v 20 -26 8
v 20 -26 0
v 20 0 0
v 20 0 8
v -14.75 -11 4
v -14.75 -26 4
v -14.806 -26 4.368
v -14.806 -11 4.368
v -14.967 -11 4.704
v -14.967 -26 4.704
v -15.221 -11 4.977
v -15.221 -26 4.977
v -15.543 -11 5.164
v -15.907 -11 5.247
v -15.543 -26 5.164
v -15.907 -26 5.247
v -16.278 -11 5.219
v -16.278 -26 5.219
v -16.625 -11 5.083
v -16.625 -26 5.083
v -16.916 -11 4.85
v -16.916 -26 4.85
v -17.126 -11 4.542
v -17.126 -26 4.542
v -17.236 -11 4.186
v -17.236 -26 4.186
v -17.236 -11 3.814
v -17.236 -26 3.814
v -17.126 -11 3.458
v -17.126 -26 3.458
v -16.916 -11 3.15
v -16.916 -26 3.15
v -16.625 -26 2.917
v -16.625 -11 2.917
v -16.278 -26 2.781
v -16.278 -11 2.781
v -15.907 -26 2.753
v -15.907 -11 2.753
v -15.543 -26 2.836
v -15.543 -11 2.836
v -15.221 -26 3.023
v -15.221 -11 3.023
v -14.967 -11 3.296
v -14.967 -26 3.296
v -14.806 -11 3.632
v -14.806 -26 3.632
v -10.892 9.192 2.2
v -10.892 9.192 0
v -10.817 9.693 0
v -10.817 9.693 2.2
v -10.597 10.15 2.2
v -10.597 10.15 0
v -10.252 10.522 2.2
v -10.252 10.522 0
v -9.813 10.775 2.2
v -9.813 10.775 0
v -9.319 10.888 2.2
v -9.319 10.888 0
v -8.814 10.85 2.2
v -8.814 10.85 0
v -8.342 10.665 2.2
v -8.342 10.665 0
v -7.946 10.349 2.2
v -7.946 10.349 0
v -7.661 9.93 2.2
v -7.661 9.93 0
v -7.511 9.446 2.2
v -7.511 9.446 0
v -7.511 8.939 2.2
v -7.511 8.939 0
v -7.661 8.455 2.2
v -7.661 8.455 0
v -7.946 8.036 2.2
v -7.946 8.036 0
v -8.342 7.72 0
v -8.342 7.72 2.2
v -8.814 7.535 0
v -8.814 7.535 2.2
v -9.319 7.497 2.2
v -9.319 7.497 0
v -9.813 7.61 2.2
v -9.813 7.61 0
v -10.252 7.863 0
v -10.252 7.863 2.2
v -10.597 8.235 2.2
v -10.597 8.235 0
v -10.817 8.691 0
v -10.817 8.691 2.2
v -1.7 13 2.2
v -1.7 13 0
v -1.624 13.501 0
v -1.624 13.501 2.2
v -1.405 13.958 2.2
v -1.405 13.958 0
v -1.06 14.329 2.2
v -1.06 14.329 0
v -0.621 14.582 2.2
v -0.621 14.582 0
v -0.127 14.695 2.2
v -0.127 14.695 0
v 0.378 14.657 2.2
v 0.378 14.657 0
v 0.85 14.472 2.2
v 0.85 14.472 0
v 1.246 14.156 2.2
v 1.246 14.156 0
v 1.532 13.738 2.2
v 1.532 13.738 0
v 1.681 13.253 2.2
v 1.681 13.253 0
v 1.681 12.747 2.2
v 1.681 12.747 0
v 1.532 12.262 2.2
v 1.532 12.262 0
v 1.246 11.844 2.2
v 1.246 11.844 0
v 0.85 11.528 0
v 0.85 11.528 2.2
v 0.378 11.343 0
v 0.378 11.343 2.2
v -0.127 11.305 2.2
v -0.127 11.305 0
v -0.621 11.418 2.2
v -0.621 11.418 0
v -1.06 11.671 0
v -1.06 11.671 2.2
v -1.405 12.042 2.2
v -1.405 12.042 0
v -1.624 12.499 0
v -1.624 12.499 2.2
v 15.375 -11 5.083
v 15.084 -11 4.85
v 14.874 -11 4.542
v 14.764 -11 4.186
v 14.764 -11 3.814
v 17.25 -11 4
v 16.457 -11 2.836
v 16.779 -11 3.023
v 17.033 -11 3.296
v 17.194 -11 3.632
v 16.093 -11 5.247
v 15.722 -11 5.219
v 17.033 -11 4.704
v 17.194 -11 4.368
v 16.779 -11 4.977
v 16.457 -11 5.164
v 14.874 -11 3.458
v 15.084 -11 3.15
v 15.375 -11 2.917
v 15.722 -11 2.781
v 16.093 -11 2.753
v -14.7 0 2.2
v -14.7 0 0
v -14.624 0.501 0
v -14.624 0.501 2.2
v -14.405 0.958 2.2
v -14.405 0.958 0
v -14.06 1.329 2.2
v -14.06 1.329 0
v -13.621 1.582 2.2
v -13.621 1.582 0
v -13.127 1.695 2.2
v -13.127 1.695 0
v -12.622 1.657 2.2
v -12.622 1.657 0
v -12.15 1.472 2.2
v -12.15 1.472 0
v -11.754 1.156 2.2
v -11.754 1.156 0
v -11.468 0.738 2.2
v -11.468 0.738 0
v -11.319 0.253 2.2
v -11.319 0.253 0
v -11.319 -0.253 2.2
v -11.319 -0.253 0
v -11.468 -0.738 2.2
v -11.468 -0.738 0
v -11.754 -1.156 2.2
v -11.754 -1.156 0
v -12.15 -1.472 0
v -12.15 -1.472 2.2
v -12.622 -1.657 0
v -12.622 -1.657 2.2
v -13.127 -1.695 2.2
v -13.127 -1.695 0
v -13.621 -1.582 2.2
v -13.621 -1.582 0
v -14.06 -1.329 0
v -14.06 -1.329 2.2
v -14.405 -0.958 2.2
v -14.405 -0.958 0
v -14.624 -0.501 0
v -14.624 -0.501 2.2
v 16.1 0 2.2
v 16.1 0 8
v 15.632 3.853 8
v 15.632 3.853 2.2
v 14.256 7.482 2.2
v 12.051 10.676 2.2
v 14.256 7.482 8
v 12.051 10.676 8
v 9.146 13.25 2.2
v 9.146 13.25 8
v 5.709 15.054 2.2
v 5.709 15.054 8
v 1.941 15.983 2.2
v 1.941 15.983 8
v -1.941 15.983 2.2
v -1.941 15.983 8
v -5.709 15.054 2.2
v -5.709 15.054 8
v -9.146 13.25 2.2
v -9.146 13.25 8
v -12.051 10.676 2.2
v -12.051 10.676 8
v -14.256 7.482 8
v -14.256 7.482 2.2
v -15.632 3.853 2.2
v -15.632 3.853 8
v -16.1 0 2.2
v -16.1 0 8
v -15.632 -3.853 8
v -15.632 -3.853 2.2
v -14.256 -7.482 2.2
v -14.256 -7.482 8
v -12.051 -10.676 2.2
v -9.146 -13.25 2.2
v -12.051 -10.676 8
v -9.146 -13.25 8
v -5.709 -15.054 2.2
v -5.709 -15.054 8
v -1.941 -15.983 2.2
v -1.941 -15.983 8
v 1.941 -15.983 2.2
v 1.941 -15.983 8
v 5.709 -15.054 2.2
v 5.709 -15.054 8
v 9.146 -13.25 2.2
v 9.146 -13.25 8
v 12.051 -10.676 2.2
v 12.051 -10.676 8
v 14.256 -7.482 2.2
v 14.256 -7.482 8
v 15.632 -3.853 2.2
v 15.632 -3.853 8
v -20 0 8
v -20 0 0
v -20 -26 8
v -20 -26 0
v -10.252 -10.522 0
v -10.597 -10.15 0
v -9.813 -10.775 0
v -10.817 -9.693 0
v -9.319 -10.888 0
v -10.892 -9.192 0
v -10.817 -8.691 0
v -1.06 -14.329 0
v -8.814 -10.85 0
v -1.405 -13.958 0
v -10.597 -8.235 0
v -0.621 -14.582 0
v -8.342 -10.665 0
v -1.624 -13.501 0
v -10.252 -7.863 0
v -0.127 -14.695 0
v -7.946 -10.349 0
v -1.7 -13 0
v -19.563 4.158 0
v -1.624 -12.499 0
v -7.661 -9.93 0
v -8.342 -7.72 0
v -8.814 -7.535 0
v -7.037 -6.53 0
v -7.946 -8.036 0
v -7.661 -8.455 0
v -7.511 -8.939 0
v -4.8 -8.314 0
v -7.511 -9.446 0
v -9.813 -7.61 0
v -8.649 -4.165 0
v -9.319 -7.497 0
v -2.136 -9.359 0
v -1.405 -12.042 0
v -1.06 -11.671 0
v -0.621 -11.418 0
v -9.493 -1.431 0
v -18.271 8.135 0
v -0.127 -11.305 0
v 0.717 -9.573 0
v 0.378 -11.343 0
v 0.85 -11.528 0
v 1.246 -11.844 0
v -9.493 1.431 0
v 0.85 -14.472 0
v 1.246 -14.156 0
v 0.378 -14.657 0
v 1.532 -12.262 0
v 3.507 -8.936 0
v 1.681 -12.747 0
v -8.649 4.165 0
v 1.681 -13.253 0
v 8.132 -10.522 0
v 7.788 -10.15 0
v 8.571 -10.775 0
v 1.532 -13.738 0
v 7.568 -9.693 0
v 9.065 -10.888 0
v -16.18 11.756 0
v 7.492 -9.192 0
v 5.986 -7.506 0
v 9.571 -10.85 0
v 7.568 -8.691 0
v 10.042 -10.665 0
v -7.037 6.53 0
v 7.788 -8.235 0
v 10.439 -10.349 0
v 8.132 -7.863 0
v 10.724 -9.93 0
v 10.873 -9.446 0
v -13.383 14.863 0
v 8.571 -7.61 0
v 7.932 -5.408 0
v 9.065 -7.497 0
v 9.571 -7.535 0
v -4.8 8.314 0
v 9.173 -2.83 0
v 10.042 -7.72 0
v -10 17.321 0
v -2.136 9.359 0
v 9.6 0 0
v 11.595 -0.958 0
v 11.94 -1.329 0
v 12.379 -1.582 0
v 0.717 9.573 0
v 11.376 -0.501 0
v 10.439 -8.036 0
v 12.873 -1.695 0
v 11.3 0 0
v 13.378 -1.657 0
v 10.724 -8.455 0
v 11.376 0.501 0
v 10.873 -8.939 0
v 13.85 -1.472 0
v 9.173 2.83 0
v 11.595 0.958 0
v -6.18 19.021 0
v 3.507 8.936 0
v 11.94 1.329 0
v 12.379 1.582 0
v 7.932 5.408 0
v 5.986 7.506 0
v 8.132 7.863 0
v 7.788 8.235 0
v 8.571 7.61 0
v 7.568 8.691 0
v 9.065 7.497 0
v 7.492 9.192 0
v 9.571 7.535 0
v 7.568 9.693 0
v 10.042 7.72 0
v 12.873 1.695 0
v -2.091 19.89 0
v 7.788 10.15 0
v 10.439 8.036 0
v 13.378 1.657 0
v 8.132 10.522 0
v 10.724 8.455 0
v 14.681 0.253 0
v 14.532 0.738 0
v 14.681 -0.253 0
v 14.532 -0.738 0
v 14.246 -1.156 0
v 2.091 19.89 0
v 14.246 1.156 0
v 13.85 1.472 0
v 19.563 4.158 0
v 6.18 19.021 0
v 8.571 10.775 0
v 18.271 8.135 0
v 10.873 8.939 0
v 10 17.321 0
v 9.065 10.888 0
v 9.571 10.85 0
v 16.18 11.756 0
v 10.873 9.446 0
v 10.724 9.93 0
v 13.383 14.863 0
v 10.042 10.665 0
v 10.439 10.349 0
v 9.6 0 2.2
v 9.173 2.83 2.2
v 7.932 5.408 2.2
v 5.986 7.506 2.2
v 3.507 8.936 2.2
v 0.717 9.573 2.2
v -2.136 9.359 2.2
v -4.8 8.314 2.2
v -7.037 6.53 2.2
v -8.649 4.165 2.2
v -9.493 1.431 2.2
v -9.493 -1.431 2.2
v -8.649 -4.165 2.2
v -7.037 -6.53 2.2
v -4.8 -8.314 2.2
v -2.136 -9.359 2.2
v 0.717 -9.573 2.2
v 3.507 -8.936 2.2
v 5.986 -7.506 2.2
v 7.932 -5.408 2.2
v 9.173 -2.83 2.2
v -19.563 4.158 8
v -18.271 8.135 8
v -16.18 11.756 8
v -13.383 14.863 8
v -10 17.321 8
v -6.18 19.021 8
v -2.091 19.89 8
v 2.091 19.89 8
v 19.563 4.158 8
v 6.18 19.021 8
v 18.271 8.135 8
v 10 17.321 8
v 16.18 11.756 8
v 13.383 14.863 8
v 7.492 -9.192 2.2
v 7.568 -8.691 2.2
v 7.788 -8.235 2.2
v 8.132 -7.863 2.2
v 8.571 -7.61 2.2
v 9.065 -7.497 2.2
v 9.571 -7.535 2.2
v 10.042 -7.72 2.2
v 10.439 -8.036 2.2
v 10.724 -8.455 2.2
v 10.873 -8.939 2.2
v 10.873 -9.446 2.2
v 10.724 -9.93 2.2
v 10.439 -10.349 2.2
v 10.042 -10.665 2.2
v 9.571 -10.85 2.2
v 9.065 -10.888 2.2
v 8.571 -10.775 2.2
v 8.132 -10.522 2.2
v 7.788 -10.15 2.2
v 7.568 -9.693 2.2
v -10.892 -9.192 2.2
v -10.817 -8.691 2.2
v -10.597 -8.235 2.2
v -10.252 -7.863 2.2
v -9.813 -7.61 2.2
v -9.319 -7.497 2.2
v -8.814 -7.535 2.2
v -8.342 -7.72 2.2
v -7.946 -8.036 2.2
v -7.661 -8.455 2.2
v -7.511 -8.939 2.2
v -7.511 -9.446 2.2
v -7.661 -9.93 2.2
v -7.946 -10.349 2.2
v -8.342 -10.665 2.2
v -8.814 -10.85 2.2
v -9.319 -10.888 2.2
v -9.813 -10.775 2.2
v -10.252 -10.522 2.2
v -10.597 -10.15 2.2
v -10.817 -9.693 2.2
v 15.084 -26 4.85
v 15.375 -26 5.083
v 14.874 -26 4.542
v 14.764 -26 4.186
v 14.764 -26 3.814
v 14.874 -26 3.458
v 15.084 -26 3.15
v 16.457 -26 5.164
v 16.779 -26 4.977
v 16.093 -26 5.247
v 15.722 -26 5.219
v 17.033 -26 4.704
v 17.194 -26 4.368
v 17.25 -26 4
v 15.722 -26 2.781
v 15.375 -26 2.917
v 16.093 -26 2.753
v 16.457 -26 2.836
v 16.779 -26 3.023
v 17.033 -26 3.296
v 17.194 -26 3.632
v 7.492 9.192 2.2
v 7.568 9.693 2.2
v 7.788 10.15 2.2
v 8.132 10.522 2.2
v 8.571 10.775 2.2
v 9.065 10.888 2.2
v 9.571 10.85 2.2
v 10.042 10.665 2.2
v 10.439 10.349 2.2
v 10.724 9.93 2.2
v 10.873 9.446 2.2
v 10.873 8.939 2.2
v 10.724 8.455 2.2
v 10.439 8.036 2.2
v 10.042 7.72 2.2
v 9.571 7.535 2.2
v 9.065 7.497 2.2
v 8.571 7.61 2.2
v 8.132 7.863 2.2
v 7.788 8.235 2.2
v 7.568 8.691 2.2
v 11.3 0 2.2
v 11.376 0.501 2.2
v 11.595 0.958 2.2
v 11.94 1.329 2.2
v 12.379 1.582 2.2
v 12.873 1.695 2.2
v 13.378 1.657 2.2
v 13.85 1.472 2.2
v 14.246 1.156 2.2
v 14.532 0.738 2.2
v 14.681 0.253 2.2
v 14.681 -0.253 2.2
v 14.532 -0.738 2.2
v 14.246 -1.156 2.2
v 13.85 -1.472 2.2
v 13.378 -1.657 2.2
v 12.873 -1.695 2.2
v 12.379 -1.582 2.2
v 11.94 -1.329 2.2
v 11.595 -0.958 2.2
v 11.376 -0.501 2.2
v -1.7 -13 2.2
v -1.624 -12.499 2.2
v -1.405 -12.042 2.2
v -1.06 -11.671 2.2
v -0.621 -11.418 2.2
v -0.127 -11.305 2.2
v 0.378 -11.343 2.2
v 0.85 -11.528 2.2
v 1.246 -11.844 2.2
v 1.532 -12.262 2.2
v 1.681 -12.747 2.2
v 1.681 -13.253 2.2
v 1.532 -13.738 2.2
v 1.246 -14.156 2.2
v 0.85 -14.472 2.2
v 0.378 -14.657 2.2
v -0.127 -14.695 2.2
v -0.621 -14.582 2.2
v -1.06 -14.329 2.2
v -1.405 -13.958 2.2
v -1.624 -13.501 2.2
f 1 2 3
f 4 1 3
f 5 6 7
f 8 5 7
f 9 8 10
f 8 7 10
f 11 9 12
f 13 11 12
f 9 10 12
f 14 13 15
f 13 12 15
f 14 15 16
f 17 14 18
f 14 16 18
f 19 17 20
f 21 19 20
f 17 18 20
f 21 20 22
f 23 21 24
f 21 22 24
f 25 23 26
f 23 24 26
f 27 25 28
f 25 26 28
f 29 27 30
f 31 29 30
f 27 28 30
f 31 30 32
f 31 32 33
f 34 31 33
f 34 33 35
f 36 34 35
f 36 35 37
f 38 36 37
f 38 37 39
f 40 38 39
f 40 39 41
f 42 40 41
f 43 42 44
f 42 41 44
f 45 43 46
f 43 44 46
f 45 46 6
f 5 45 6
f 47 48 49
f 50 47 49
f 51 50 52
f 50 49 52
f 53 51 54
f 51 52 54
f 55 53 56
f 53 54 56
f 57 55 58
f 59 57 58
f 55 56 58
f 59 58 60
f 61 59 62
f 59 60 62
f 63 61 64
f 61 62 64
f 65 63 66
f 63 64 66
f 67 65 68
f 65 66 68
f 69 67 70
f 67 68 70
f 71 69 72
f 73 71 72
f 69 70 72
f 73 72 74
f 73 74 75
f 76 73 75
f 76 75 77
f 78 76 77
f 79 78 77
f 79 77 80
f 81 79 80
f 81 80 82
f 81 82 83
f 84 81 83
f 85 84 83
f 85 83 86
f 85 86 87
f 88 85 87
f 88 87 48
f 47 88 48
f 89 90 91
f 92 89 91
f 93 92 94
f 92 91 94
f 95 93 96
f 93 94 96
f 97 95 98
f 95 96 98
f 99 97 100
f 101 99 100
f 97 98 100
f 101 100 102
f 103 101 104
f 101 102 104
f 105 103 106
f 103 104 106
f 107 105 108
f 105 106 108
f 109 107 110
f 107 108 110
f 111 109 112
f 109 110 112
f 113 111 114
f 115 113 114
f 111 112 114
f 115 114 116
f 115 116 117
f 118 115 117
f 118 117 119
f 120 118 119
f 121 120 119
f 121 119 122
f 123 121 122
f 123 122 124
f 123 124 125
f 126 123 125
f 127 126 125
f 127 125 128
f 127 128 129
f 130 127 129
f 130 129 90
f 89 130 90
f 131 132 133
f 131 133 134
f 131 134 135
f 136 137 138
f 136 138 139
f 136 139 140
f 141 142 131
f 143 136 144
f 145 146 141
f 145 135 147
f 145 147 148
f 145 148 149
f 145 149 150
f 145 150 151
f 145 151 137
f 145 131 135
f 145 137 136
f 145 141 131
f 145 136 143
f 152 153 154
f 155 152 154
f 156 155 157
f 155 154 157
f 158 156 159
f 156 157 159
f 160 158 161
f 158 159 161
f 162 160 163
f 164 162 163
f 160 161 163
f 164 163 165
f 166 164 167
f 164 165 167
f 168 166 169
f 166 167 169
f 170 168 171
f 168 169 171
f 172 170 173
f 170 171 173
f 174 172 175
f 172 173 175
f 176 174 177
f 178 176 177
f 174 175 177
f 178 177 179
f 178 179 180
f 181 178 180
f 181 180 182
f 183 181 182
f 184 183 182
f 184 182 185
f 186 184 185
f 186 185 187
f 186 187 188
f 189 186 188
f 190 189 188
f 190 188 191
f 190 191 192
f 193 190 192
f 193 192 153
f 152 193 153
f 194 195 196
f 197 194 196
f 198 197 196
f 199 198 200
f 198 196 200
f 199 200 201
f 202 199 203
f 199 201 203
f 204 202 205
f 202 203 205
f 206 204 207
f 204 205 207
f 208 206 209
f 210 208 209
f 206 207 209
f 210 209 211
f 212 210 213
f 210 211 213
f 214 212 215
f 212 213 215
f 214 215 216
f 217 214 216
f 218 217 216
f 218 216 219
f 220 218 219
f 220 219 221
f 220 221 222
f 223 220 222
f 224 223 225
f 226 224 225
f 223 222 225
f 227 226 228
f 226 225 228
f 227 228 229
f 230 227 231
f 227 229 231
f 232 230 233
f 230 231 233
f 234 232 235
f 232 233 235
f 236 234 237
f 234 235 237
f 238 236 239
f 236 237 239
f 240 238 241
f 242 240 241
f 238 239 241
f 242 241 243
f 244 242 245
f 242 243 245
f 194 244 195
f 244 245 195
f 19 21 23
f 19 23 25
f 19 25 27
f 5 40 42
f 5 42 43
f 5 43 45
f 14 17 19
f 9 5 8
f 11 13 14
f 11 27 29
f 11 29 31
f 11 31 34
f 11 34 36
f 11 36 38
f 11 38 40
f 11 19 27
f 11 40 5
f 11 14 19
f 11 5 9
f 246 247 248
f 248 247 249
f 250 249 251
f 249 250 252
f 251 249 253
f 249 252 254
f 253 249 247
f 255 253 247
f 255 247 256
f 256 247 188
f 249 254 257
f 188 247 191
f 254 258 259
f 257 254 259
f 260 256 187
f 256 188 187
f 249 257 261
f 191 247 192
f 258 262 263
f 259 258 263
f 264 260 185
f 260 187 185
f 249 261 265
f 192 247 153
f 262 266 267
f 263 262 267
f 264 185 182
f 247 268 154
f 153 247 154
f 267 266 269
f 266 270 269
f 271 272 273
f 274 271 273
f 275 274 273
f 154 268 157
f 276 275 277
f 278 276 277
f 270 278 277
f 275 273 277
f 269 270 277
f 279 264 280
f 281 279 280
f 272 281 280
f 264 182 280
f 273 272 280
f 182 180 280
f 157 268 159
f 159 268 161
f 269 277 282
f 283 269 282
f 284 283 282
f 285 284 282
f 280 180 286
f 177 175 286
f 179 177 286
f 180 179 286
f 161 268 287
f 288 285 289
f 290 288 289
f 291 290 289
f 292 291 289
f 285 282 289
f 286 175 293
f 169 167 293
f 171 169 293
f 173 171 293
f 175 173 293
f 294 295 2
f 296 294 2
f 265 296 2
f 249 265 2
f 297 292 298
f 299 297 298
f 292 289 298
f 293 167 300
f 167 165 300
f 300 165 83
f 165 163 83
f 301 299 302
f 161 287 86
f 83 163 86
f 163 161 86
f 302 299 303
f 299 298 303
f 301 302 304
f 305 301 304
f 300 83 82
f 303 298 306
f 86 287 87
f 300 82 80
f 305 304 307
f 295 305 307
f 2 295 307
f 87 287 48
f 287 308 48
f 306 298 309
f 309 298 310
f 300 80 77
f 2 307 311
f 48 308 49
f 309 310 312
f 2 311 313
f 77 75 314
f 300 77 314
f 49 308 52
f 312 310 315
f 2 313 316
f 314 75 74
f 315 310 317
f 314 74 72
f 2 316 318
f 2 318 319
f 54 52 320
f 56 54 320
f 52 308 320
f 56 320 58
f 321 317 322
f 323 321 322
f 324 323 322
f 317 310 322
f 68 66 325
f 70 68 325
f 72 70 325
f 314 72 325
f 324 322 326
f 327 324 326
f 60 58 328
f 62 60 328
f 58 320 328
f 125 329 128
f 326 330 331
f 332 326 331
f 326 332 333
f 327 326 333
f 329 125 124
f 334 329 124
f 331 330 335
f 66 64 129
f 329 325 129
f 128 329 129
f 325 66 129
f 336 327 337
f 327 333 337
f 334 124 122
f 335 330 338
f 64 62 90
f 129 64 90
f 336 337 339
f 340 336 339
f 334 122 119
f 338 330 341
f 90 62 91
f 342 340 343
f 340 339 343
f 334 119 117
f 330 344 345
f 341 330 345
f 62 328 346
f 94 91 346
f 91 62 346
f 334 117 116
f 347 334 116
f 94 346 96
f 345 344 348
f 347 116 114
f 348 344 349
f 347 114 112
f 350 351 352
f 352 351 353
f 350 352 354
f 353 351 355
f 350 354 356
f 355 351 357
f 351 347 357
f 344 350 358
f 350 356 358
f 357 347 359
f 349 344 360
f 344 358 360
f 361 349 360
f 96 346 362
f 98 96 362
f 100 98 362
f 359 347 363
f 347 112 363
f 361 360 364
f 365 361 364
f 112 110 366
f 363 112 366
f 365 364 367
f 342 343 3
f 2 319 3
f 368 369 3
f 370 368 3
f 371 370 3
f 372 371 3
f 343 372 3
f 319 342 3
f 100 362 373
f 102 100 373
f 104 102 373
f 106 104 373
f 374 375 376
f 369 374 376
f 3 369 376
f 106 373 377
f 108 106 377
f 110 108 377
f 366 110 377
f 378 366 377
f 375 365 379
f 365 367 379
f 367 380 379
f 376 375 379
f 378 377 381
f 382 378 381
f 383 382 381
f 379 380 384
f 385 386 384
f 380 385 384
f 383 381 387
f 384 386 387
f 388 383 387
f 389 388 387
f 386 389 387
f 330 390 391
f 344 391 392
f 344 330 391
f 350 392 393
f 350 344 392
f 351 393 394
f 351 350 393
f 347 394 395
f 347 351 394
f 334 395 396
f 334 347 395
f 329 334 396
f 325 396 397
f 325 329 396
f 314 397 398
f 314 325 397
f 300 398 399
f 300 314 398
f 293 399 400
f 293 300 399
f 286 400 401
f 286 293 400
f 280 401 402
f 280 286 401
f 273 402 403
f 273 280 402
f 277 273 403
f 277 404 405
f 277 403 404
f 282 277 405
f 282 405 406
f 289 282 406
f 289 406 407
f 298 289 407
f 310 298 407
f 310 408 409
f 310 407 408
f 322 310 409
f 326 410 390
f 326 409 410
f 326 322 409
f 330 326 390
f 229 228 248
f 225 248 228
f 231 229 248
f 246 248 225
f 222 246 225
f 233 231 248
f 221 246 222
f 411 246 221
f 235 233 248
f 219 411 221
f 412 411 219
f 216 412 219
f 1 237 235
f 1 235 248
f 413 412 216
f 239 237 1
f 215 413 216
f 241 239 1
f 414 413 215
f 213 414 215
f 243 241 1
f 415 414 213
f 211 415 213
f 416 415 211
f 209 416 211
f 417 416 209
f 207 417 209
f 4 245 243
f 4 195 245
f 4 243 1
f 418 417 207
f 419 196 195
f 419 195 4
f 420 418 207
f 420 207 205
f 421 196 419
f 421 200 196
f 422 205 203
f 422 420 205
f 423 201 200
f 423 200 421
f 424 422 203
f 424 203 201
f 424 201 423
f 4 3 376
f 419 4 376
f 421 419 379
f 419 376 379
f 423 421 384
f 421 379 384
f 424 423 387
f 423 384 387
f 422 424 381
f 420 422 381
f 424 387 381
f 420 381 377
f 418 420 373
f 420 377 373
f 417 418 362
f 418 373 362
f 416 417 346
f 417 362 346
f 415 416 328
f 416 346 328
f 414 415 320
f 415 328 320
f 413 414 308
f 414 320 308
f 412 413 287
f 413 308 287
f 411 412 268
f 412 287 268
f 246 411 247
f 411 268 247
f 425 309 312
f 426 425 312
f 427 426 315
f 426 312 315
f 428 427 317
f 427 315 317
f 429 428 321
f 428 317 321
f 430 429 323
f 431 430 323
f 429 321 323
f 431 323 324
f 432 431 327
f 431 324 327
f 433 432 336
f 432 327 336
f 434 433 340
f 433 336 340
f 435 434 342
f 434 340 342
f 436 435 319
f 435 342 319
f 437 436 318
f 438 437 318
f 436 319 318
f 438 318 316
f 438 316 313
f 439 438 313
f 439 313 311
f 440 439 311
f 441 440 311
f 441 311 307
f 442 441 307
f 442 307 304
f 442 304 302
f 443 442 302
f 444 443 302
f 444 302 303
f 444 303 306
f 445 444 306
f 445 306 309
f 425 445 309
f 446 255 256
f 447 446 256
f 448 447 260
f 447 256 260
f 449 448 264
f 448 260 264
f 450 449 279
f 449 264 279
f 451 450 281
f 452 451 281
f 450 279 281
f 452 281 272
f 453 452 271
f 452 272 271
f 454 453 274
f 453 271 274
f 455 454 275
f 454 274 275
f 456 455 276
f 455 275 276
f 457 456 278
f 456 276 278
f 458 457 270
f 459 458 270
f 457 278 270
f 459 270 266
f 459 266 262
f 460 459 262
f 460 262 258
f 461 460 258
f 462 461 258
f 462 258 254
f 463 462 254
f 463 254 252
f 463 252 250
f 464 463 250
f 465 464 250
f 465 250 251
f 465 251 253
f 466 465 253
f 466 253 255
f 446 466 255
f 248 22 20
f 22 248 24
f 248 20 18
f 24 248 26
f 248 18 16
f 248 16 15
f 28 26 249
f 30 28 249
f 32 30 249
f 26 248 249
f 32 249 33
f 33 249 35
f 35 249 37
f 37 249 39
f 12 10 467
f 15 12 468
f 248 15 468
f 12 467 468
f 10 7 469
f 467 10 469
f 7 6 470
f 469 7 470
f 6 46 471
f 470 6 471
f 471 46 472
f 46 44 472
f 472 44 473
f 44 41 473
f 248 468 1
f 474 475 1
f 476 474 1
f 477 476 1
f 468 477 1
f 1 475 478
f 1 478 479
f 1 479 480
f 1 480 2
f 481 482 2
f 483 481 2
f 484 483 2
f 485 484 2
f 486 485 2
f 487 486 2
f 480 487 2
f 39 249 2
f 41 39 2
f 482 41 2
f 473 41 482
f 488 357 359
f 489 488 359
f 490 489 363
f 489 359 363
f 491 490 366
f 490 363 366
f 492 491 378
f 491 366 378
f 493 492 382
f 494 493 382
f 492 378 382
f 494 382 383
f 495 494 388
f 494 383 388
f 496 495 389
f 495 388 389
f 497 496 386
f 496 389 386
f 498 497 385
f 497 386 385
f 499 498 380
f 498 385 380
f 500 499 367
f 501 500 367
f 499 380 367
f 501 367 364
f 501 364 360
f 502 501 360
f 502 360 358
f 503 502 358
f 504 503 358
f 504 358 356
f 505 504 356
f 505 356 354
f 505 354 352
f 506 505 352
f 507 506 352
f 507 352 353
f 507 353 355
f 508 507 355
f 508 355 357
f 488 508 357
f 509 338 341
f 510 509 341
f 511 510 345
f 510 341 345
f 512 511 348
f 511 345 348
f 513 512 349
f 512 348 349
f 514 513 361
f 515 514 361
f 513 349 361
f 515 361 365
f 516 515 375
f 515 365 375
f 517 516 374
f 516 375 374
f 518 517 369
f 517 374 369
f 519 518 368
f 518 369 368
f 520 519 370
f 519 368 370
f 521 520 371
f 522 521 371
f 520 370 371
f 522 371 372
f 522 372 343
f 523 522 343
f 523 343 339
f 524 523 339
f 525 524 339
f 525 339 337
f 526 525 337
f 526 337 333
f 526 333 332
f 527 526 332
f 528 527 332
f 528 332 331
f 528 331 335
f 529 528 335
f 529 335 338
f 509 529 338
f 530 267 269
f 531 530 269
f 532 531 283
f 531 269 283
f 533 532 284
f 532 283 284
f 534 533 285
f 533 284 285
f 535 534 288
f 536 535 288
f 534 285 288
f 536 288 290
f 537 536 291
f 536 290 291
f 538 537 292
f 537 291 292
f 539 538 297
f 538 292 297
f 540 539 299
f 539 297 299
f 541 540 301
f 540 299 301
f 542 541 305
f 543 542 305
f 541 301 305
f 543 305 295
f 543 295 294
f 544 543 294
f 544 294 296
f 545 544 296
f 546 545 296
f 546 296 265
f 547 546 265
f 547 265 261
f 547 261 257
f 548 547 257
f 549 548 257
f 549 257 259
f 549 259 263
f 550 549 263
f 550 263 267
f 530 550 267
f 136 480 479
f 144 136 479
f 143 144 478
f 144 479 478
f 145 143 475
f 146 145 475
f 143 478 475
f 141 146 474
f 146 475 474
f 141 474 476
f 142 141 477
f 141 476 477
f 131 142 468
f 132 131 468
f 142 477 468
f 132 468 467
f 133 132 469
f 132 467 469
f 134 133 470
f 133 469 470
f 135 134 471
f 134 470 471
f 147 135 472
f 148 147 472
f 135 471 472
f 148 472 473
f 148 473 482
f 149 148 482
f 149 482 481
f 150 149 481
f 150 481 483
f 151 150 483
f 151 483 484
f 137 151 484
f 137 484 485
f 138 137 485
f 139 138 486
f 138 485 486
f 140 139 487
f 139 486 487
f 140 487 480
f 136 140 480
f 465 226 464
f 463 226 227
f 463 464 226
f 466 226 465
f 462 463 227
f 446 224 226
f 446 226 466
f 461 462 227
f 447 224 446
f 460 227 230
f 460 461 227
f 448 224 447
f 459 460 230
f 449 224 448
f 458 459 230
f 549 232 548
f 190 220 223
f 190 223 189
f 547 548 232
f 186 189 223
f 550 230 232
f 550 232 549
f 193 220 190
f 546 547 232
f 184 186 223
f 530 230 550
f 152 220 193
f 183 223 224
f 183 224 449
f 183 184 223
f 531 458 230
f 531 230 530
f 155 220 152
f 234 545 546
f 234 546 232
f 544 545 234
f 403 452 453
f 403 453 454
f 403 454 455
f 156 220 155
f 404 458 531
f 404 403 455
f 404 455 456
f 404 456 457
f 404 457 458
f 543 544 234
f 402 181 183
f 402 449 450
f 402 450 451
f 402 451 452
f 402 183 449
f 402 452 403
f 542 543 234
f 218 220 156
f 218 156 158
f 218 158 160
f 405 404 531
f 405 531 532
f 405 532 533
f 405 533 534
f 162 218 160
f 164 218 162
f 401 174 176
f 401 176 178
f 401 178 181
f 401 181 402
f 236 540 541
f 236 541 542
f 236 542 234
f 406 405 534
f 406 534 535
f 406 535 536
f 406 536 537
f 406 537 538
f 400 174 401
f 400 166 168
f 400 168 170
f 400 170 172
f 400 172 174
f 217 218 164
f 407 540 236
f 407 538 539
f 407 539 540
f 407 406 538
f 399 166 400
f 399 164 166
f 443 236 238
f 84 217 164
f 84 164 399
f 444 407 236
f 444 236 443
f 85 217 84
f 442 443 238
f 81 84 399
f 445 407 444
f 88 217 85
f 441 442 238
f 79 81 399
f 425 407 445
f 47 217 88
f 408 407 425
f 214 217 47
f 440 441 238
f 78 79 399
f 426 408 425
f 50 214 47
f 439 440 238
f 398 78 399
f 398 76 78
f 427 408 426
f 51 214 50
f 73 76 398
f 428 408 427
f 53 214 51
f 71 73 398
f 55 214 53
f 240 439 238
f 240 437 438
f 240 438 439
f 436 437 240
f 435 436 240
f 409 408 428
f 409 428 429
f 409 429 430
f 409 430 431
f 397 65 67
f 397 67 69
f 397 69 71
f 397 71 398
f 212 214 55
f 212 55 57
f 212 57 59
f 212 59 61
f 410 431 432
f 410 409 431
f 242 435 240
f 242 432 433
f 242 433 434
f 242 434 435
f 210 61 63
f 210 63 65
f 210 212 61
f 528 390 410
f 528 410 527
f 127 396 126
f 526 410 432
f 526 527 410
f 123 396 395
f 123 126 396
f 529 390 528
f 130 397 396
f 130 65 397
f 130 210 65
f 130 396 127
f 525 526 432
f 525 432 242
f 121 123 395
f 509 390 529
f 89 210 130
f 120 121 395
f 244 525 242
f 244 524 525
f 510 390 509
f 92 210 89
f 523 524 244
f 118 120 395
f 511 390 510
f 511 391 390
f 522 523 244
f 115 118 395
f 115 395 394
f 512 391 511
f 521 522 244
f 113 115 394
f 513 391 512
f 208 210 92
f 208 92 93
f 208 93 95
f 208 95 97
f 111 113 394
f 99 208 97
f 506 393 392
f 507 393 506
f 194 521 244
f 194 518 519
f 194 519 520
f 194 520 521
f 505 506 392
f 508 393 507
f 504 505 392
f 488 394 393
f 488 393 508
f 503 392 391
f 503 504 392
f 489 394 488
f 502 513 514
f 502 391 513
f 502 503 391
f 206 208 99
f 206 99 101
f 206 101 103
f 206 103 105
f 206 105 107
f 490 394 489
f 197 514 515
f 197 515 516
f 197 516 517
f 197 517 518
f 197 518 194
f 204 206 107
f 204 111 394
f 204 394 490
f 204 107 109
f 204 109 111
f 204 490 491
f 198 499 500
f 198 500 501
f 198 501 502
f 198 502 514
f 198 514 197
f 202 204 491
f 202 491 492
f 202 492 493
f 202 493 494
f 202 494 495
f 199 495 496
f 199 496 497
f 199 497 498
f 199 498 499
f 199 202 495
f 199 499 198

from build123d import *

# Parameters (mm, degrees)
ESQUISSE1_R             = 9.6
BOSS_EXTRU_1_DEPTH      = 8
ESQUISSE2_R             = 16.1
ENL_V_MAT_EXTRU_1_DEPTH = 5.8
ENL_V_MAT_EXTRU_2_REACH = 10
ESQUISSE3_R             = 1.7
ESQUISSE4_R             = 1.25
ENL_V_MAT_EXTRU_3_DEPTH = 15


with BuildPart() as part:
    # Esquisse1 → Boss.-Extru.1 (new body)
    with BuildSketch(Plane.XY):
        with BuildLine():
            Line((-20, 0), (-20, -26))
            Line((-20, -26), (20, -26))
            Line((20, -26), (20, 0))
            ThreePointArc((20, 0), (0, 20), (-20, 0))
        make_face()
        Circle(ESQUISSE1_R, mode=Mode.SUBTRACT)
    extrude(amount=BOSS_EXTRU_1_DEPTH)

    # Esquisse2 → Enlèv. mat.-Extru.1 (cut)
    with BuildSketch(Plane.XY.offset(8)):
        Circle(ESQUISSE2_R)
    extrude(amount=-ENL_V_MAT_EXTRU_1_DEPTH, mode=Mode.SUBTRACT)

    # Esquisse3 → Enlèv. mat.-Extru.2 (cut, up to next)
    with BuildSketch(Plane(origin=(0, 0, 0), x_dir=(-1, 0, 0), z_dir=(0, 0, -1)), mode=Mode.PRIVATE) as enl_v_mat_extru_2_sk1:
        with Locations((0, 13)):
            Circle(ESQUISSE3_R)
    enl_v_mat_extru_2_tool1 = extrude(enl_v_mat_extru_2_sk1.sketch, amount=-ENL_V_MAT_EXTRU_2_REACH, mode=Mode.PRIVATE) & part.part
    add(enl_v_mat_extru_2_tool1.solids().sort_by_distance((0, 13, 0))[0], mode=Mode.SUBTRACT)
    # Esquisse3 → Enlèv. mat.-Extru.2 (cut, up to next)
    with BuildSketch(Plane(origin=(0, 0, 0), x_dir=(-1, 0, 0), z_dir=(0, 0, -1)), mode=Mode.PRIVATE) as enl_v_mat_extru_2_sk2:
        with Locations((9.192388155, 9.192388155)):
            Circle(ESQUISSE3_R)
    enl_v_mat_extru_2_tool2 = extrude(enl_v_mat_extru_2_sk2.sketch, amount=-ENL_V_MAT_EXTRU_2_REACH, mode=Mode.PRIVATE) & part.part
    add(enl_v_mat_extru_2_tool2.solids().sort_by_distance((-9.192388, 9.192388, 0))[0], mode=Mode.SUBTRACT)
    # Esquisse3 → Enlèv. mat.-Extru.2 (cut, up to next)
    with BuildSketch(Plane(origin=(0, 0, 0), x_dir=(-1, 0, 0), z_dir=(0, 0, -1)), mode=Mode.PRIVATE) as enl_v_mat_extru_2_sk3:
        with Locations((13, 0)):
            Circle(ESQUISSE3_R)
    enl_v_mat_extru_2_tool3 = extrude(enl_v_mat_extru_2_sk3.sketch, amount=-ENL_V_MAT_EXTRU_2_REACH, mode=Mode.PRIVATE) & part.part
    add(enl_v_mat_extru_2_tool3.solids().sort_by_distance((-13, 0, 0))[0], mode=Mode.SUBTRACT)
    # Esquisse3 → Enlèv. mat.-Extru.2 (cut, up to next)
    with BuildSketch(Plane(origin=(0, 0, 0), x_dir=(-1, 0, 0), z_dir=(0, 0, -1)), mode=Mode.PRIVATE) as enl_v_mat_extru_2_sk4:
        with Locations((9.192388155, -9.192388155)):
            Circle(ESQUISSE3_R)
    enl_v_mat_extru_2_tool4 = extrude(enl_v_mat_extru_2_sk4.sketch, amount=-ENL_V_MAT_EXTRU_2_REACH, mode=Mode.PRIVATE) & part.part
    add(enl_v_mat_extru_2_tool4.solids().sort_by_distance((-9.192388, -9.192388, 0))[0], mode=Mode.SUBTRACT)
    # Esquisse3 → Enlèv. mat.-Extru.2 (cut, up to next)
    with BuildSketch(Plane(origin=(0, 0, 0), x_dir=(-1, 0, 0), z_dir=(0, 0, -1)), mode=Mode.PRIVATE) as enl_v_mat_extru_2_sk5:
        with Locations((0, -13)):
            Circle(ESQUISSE3_R)
    enl_v_mat_extru_2_tool5 = extrude(enl_v_mat_extru_2_sk5.sketch, amount=-ENL_V_MAT_EXTRU_2_REACH, mode=Mode.PRIVATE) & part.part
    add(enl_v_mat_extru_2_tool5.solids().sort_by_distance((0, -13, 0))[0], mode=Mode.SUBTRACT)
    # Esquisse3 → Enlèv. mat.-Extru.2 (cut, up to next)
    with BuildSketch(Plane(origin=(0, 0, 0), x_dir=(-1, 0, 0), z_dir=(0, 0, -1)), mode=Mode.PRIVATE) as enl_v_mat_extru_2_sk6:
        with Locations((-9.192388155, -9.192388155)):
            Circle(ESQUISSE3_R)
    enl_v_mat_extru_2_tool6 = extrude(enl_v_mat_extru_2_sk6.sketch, amount=-ENL_V_MAT_EXTRU_2_REACH, mode=Mode.PRIVATE) & part.part
    add(enl_v_mat_extru_2_tool6.solids().sort_by_distance((9.192388, -9.192388, 0))[0], mode=Mode.SUBTRACT)
    # Esquisse3 → Enlèv. mat.-Extru.2 (cut, up to next)
    with BuildSketch(Plane(origin=(0, 0, 0), x_dir=(-1, 0, 0), z_dir=(0, 0, -1)), mode=Mode.PRIVATE) as enl_v_mat_extru_2_sk7:
        with Locations((-13, 0)):
            Circle(ESQUISSE3_R)
    enl_v_mat_extru_2_tool7 = extrude(enl_v_mat_extru_2_sk7.sketch, amount=-ENL_V_MAT_EXTRU_2_REACH, mode=Mode.PRIVATE) & part.part
    add(enl_v_mat_extru_2_tool7.solids().sort_by_distance((13, 0, 0))[0], mode=Mode.SUBTRACT)
    # Esquisse3 → Enlèv. mat.-Extru.2 (cut, up to next)
    with BuildSketch(Plane(origin=(0, 0, 0), x_dir=(-1, 0, 0), z_dir=(0, 0, -1)), mode=Mode.PRIVATE) as enl_v_mat_extru_2_sk8:
        with Locations((-9.192388155, 9.192388155)):
            Circle(ESQUISSE3_R)
    enl_v_mat_extru_2_tool8 = extrude(enl_v_mat_extru_2_sk8.sketch, amount=-ENL_V_MAT_EXTRU_2_REACH, mode=Mode.PRIVATE) & part.part
    add(enl_v_mat_extru_2_tool8.solids().sort_by_distance((9.192388, 9.192388, 0))[0], mode=Mode.SUBTRACT)

    # Esquisse4 → Enlèv. mat.-Extru.3 (cut)
    with BuildSketch(Plane.XZ.offset(26)):
        with Locations((-16, 4)):
            Circle(ESQUISSE4_R)
        with Locations((16, 4)):
            Circle(ESQUISSE4_R)
    extrude(amount=-ENL_V_MAT_EXTRU_3_DEPTH, mode=Mode.SUBTRACT)


solid = part.part
